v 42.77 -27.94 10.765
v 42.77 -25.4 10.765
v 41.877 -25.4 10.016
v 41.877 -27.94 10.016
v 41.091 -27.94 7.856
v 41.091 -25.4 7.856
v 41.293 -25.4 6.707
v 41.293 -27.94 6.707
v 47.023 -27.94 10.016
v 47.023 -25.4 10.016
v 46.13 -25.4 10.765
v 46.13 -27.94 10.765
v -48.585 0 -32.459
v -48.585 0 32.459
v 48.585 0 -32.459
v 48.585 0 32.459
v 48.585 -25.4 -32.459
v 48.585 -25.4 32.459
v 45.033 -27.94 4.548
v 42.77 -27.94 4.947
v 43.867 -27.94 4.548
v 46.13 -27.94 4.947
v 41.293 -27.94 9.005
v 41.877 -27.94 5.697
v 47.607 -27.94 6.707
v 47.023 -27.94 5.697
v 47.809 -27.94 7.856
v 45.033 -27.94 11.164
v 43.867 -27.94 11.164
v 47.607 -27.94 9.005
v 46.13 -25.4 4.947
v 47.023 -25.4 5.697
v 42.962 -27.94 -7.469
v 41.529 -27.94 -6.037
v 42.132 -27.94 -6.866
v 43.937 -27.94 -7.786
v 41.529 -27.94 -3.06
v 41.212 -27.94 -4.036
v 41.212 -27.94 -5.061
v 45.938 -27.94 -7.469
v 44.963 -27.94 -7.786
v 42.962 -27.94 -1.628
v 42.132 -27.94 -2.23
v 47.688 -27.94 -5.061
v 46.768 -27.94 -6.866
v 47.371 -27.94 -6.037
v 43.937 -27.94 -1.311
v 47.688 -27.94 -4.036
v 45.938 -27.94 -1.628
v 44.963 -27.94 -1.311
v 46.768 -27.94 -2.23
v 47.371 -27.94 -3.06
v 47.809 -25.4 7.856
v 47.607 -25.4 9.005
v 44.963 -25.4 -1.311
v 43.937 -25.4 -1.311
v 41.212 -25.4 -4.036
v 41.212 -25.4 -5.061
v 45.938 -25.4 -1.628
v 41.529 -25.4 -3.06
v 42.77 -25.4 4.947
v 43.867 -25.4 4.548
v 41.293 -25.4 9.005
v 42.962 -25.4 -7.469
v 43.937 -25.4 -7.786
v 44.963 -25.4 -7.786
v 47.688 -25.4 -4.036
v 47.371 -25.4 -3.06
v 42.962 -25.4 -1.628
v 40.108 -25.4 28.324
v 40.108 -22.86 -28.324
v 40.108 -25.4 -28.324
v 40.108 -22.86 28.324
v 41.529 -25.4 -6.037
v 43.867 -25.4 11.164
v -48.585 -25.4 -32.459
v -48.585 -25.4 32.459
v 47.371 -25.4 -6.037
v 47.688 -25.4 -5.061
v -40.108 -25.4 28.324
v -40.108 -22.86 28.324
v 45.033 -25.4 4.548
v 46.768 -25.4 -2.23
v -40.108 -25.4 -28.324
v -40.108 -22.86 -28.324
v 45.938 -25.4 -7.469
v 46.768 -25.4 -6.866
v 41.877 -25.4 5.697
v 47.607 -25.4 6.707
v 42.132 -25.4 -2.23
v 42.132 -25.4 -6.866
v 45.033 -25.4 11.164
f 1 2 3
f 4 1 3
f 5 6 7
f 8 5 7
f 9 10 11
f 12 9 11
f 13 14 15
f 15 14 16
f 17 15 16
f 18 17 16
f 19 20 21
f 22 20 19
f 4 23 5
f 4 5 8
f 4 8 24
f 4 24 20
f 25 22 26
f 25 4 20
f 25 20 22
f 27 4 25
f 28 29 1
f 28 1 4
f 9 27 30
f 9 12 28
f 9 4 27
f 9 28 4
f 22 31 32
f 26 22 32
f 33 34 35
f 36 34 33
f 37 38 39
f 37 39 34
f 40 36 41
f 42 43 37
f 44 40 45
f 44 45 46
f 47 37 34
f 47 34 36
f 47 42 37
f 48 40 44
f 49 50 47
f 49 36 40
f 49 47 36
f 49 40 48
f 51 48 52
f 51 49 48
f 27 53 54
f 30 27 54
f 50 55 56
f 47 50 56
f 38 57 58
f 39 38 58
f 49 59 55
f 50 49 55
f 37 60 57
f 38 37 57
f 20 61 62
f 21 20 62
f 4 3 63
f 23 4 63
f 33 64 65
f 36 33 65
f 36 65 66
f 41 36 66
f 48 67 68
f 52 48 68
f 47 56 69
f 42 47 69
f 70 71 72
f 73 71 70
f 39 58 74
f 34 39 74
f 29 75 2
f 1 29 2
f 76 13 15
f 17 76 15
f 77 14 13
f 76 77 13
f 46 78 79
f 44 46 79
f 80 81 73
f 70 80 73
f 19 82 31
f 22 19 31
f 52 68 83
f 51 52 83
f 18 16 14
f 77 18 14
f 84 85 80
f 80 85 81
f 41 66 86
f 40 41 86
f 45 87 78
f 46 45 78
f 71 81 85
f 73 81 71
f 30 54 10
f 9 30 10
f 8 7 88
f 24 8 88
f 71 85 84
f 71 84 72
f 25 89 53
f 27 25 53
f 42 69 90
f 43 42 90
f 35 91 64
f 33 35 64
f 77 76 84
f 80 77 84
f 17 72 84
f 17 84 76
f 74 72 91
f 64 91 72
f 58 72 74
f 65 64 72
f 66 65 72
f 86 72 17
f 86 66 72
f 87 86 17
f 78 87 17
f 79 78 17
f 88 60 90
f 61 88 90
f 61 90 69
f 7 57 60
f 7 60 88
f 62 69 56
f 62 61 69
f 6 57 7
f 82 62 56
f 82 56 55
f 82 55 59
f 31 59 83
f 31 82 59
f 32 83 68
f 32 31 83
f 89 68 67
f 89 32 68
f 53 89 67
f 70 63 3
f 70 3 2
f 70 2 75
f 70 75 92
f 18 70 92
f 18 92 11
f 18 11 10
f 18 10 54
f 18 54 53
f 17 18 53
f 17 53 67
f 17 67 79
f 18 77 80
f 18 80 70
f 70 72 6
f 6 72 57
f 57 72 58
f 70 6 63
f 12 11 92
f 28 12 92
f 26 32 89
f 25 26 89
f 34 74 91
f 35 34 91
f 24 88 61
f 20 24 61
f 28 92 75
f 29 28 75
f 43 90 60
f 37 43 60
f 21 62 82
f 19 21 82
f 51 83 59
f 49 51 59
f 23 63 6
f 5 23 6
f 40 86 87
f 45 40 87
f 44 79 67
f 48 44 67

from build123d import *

# Parameters (mm, degrees)
F0_W     = 80.216743052
F0_H     = 56.6479042172
F1_DEPTH = 25.4
F2_DEPTH = 22.86
F3_DEPTH = 27.94
F4_DEPTH = 27.94


# Not quite as in the source:
# - the program builds the solid bodies; features that only make, move or delete a surface that nothing else refers to are left out


with BuildPart() as f1:
    # F0 (on Front) → F1 (new body)
    with BuildSketch(Plane.XZ):
        Polygon((-48.5848858953, 32.4588380754), (-48.5848858953, -32.4588380754), (48.5848858953, -32.4588380754), (48.5848858953, 32.4588380754), (23.2139006257, 32.4588380754), align=None)
        Polygon((45.9382493502, -7.469226185), (44.9628157303, -7.7861637805), (43.9371841267, -7.7861637805), (42.9617505067, -7.469226185), (42.1319971095, -6.8663750542), (41.5291459786, -6.0366216569), (41.2122083831, -5.061188037), (41.2122083831, -4.0355564333), (41.5291459786, -3.0601228134), (42.1319971095, -2.2303694161), (42.9617505067, -1.6275182853), (43.9371841267, -1.3105806898), (44.9628157303, -1.3105806898), (45.9382493502, -1.6275182853), (46.7680027475, -2.2303694161), (47.3708538784, -3.0601228134), (47.6877914738, -4.0355564333), (47.6877914738, -5.061188037), (47.3708538784, -6.0366216569), (46.7680027475, -6.8663750542), align=None, mode=Mode.SUBTRACT)
        Rectangle(F0_W, F0_H, mode=Mode.SUBTRACT)
        Polygon((46.129602097, 4.9471233192), (45.03331964, 4.5481091365), (43.8666802169, 4.5481091365), (42.77039776, 4.9471233192), (41.8767001128, 5.6970246853), (41.2933804012, 6.7073640628), (41.0907955914, 7.8562796116), (41.2933804012, 9.0051951604), (41.8767001128, 10.0155345378), (42.77039776, 10.765435904), (43.8666802169, 11.1644500867), (45.03331964, 11.1644500867), (46.129602097, 10.765435904), (47.0232997442, 10.0155345378), (47.6066194557, 9.0051951604), (47.8092042655, 7.8562796116), (47.6066194557, 6.7073640628), (47.0232997442, 5.6970246853), align=None, mode=Mode.SUBTRACT)
    extrude(amount=F1_DEPTH)

    # F0 (on Front) → F2 (join)
    with BuildSketch(Plane.XZ):
        Rectangle(F0_W, F0_H)
    extrude(amount=F2_DEPTH)

    # F0 (on Front) → F3 (join)
    with BuildSketch(Plane.XZ):
        Polygon((43.8666802169, 4.5481091365), (45.03331964, 4.5481091365), (46.129602097, 4.9471233192), (47.0232997442, 5.6970246853), (47.6066194557, 6.7073640628), (47.8092042655, 7.8562796116), (47.6066194557, 9.0051951604), (47.0232997442, 10.0155345378), (46.129602097, 10.765435904), (45.03331964, 11.1644500867), (43.8666802169, 11.1644500867), (42.77039776, 10.765435904), (41.8767001128, 10.0155345378), (41.2933804012, 9.0051951604), (41.0907955914, 7.8562796116), (41.2933804012, 6.7073640628), (41.8767001128, 5.6970246853), (42.77039776, 4.9471233192), align=None)
    extrude(amount=F3_DEPTH)

    # F0 (on Front) → F4 (join)
    with BuildSketch(Plane.XZ):
        Polygon((43.9371841267, -7.7861637805), (44.9628157303, -7.7861637805), (45.9382493502, -7.469226185), (46.7680027475, -6.8663750542), (47.3708538784, -6.0366216569), (47.6877914738, -5.061188037), (47.6877914738, -4.0355564333), (47.3708538784, -3.0601228134), (46.7680027475, -2.2303694161), (45.9382493502, -1.6275182853), (44.9628157303, -1.3105806898), (43.9371841267, -1.3105806898), (42.9617505067, -1.6275182853), (42.1319971095, -2.2303694161), (41.5291459786, -3.0601228134), (41.2122083831, -4.0355564333), (41.2122083831, -5.061188037), (41.5291459786, -6.0366216569), (42.1319971095, -6.8663750542), (42.9617505067, -7.469226185), align=None)
    extrude(amount=F4_DEPTH)


solid = f1.part
